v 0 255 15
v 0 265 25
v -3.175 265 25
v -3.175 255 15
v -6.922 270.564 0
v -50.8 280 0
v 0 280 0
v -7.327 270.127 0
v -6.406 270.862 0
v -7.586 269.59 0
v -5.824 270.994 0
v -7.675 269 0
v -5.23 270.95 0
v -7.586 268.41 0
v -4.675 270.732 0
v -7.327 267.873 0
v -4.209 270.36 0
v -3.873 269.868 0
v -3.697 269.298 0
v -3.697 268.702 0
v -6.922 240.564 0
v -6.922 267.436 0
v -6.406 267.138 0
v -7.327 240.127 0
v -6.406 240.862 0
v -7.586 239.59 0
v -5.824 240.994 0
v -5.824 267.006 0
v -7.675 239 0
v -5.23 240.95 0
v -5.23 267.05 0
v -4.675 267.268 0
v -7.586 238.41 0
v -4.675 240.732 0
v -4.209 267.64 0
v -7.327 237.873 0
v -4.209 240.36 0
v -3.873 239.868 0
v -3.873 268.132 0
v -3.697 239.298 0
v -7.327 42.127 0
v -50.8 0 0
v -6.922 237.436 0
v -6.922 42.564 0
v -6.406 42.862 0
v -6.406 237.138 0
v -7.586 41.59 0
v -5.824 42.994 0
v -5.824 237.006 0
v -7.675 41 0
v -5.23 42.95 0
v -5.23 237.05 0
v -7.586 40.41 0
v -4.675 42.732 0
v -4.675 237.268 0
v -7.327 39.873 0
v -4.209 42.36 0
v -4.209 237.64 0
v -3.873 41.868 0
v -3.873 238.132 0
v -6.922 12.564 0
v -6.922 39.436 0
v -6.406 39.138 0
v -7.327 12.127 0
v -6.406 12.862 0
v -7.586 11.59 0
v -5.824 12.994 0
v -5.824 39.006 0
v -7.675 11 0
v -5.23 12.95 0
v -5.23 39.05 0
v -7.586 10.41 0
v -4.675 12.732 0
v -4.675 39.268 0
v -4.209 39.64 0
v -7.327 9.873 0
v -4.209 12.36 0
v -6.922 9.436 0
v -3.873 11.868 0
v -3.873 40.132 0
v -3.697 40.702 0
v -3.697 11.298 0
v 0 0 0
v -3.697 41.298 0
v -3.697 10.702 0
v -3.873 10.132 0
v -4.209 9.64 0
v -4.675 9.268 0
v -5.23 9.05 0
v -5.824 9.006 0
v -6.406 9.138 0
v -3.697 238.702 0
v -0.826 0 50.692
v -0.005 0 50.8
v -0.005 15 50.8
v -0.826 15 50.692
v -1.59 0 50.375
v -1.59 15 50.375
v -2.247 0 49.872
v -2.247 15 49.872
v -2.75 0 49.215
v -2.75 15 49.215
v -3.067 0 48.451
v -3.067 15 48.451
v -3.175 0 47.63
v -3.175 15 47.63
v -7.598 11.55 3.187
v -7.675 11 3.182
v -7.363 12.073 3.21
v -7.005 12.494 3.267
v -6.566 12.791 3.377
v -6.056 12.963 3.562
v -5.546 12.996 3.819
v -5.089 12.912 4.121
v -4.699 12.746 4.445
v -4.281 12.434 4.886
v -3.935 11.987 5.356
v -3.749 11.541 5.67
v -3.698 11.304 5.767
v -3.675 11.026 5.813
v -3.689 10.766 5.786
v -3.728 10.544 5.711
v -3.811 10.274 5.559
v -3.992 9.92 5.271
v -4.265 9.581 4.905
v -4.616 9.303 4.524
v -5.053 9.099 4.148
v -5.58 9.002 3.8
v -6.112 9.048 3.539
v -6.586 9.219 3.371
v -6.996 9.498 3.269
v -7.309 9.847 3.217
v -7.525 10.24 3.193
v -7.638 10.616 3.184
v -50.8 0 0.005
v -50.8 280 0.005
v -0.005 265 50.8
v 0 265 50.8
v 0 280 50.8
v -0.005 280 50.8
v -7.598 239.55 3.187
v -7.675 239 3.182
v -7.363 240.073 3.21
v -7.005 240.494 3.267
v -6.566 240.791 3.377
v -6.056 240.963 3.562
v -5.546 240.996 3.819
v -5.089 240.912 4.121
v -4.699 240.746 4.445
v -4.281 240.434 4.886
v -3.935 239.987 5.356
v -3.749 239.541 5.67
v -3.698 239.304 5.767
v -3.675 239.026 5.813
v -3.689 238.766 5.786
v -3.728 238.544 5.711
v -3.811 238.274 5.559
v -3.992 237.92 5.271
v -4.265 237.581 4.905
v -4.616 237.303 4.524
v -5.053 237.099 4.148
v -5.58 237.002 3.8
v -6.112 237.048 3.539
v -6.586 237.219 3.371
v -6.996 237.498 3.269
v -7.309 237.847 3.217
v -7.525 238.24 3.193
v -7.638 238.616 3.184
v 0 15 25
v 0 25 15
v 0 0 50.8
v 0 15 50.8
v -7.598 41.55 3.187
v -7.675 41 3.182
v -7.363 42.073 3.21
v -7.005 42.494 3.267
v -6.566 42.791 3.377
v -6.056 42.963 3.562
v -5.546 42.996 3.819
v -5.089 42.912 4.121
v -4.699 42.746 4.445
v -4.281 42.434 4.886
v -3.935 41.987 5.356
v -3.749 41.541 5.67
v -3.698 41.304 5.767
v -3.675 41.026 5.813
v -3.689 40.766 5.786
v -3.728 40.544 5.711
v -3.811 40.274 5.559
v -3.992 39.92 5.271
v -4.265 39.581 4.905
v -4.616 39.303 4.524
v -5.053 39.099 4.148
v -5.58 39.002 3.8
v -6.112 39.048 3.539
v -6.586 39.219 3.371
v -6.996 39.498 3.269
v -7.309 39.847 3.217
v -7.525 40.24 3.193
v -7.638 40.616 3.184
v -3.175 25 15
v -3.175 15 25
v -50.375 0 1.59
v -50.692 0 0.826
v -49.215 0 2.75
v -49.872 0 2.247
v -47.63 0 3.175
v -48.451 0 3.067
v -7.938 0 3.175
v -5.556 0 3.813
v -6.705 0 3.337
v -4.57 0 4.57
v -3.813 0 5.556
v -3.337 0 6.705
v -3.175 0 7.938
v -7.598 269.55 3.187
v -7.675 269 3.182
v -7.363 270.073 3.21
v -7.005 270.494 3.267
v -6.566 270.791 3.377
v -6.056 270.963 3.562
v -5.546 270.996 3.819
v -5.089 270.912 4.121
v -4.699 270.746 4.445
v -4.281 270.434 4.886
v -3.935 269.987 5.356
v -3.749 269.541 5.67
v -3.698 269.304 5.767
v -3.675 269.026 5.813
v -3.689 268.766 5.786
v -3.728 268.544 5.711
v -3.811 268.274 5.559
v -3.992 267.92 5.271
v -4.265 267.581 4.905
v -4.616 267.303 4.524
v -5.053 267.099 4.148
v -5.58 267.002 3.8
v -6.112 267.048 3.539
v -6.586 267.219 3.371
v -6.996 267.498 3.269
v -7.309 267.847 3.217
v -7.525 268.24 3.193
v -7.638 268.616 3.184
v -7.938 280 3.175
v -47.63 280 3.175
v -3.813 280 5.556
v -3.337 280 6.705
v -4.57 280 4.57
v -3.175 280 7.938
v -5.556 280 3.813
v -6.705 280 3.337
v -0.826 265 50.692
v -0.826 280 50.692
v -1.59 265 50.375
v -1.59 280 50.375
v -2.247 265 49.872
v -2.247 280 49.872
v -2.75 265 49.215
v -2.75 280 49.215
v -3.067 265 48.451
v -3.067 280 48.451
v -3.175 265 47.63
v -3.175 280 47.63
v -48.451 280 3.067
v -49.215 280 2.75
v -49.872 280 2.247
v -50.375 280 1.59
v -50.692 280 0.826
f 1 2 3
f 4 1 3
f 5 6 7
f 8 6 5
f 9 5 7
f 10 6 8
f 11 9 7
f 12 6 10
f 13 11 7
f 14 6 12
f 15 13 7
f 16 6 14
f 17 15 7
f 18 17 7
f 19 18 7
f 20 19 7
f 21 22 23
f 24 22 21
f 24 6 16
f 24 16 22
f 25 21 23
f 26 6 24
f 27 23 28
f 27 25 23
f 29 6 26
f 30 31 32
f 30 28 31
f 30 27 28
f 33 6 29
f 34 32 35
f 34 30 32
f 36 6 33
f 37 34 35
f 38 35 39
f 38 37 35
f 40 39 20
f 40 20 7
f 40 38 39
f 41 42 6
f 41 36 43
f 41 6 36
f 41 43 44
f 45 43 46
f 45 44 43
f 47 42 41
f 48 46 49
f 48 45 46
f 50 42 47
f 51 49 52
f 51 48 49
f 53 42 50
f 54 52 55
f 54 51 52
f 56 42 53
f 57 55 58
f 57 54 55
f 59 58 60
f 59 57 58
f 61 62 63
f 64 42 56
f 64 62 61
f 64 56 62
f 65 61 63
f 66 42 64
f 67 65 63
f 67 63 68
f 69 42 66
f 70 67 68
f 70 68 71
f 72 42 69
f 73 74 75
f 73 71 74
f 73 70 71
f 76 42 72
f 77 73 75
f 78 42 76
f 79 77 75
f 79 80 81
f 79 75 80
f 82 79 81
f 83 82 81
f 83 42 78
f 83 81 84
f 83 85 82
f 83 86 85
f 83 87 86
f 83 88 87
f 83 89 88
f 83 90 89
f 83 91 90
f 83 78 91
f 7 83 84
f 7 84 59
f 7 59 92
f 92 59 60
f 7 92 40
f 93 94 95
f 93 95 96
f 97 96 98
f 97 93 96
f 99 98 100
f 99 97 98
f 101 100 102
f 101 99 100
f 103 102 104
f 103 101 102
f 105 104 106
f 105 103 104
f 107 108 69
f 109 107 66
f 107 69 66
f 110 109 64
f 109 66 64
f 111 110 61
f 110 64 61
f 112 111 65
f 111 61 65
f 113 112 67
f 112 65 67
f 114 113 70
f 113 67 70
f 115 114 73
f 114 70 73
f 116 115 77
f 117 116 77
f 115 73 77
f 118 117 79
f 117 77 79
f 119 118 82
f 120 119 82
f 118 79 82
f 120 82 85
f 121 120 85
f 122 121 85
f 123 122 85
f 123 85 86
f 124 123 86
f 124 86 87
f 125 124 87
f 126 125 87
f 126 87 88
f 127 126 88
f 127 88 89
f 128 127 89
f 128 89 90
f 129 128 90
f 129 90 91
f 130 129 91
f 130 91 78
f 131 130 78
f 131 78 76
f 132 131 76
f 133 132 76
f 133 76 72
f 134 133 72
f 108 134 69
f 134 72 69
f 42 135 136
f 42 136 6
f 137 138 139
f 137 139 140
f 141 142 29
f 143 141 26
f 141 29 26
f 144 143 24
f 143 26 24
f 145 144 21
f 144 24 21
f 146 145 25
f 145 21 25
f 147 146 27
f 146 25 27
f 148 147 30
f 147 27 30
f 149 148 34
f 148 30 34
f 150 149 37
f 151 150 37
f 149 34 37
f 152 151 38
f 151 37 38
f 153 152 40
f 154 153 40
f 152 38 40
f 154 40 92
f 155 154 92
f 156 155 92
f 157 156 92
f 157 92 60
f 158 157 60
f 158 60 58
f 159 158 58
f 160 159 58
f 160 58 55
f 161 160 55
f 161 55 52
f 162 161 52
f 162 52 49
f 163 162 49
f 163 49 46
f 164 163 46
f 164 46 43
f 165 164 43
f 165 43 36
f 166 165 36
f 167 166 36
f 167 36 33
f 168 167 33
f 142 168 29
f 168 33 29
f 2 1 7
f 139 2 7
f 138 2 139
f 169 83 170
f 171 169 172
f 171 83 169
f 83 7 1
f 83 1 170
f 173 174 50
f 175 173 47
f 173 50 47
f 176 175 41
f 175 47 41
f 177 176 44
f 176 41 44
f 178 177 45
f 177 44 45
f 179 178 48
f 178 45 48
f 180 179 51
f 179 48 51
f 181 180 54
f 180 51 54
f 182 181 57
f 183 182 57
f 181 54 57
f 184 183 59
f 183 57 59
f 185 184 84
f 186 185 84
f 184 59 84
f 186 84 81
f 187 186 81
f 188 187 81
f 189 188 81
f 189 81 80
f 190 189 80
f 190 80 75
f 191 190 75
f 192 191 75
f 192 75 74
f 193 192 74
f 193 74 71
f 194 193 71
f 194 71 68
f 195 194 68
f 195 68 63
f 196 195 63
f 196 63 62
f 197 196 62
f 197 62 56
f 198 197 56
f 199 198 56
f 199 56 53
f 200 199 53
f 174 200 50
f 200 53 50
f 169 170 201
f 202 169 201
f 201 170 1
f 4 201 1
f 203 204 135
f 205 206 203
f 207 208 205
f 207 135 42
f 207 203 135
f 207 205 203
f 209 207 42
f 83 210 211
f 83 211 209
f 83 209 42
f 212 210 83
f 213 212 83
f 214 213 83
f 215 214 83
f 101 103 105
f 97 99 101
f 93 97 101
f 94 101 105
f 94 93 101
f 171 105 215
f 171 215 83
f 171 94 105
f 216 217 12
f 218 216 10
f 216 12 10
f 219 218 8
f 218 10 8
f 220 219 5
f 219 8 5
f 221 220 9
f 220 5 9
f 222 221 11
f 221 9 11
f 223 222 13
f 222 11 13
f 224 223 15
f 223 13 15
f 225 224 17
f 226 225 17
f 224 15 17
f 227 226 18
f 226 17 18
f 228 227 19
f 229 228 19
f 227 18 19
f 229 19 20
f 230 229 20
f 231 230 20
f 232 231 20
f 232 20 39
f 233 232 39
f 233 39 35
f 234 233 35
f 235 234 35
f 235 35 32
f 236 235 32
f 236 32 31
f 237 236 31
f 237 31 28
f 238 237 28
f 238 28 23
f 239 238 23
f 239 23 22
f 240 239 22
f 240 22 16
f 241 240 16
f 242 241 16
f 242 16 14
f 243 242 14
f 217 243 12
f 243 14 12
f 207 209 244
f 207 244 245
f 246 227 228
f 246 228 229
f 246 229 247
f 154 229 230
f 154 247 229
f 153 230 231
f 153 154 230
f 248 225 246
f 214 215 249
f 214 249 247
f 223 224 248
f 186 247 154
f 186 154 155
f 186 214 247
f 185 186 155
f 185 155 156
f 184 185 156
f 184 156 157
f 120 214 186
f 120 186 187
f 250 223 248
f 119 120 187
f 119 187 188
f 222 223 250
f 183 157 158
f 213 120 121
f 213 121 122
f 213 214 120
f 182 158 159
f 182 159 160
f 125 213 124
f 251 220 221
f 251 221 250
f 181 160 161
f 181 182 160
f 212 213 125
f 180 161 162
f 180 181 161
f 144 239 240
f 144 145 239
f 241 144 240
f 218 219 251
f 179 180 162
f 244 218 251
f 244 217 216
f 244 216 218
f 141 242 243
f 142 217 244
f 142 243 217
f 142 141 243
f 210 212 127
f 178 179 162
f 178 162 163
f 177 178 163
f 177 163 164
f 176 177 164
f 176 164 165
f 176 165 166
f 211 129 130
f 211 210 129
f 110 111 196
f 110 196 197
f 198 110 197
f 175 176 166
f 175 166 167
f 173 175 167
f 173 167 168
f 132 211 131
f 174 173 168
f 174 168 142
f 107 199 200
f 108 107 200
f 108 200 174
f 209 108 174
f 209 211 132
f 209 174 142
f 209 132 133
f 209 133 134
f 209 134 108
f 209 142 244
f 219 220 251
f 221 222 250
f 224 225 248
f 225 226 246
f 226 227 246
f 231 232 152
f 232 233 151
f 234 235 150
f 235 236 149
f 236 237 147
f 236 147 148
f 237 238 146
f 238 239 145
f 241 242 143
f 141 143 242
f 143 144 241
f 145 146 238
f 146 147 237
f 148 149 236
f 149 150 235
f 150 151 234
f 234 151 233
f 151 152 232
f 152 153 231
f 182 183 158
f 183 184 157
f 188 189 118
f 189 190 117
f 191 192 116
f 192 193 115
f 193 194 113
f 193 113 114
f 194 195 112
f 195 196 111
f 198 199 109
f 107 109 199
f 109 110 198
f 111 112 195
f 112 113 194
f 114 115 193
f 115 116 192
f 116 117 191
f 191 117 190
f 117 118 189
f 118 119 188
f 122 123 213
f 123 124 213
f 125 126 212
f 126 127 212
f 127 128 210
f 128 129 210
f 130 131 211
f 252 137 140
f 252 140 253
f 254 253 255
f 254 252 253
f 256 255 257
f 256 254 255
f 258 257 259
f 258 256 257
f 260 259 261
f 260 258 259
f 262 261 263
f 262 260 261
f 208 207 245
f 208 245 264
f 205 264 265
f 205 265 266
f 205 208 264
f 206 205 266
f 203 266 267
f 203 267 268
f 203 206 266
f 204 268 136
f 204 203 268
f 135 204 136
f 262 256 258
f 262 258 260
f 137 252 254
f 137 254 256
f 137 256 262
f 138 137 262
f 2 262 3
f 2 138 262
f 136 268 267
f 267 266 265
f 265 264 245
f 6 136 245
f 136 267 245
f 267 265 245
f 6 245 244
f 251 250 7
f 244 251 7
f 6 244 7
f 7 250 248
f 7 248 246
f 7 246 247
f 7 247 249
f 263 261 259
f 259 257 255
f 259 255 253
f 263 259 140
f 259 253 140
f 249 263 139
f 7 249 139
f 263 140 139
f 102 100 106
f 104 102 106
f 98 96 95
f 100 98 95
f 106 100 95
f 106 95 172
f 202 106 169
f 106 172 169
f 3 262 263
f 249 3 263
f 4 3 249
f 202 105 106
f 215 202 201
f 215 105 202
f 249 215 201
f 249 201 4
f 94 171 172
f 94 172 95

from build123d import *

# Parameters (mm, degrees)
ANGULAR_ALUMINIO_ANGULAR_38MM_1_DEPTH = 280
CROQUIS8_W                            = 35.8
CROQUIS8_H                            = 250
CORTAR_EXTRUIR1_DEPTH                 = 4
CHAFL_N1_SIZE                         = 10
CROQUIS10_R                           = 2
CORTAR_EXTRUIR3_DEPTH                 = 10
CROQUIS12_R                           = 2
CORTAR_EXTRUIR4_DEPTH                 = 10


with BuildPart() as part:
    # Sketch11 → Angular ALUMINIO ANGULAR 38MM(1) (new body)
    with BuildSketch(Plane(origin=(0, 0, 0), x_dir=(-1, 0, 0), z_dir=(0, 1, 0))):
        with BuildLine():
            Line((0, 0), (0, 50.8))
            Line((0, 50.8), (0.00508, 50.8))
            ThreePointArc((0.00508, 50.8), (2.246551928, 49.871551928), (3.175, 47.63008))
            Line((3.175, 47.63008), (3.175, 7.9375))
            ThreePointArc((3.175, 7.9375), (4.569903955, 4.569903955), (7.9375, 3.175))
            Line((7.9375, 3.175), (47.63008, 3.175))
            ThreePointArc((47.63008, 3.175), (49.871551928, 2.246551928), (50.8, 0.00508))
            Line((50.8, 0.00508), (50.8, 0))
            Line((50.8, 0), (0, 0))
        make_face()
    extrude(amount=ANGULAR_ALUMINIO_ANGULAR_38MM_1_DEPTH)

    # Croquis8 → Cortar-Extruir1 (cut)
    with BuildSketch(Plane(origin=(0, 0, 0), x_dir=(0, 0, -1), z_dir=(1, 0, 0))):
        with Locations((-32.9, 140)):
            Rectangle(CROQUIS8_W, CROQUIS8_H)
    extrude(amount=-CORTAR_EXTRUIR1_DEPTH, mode=Mode.SUBTRACT)

    # Chaflán1
    chafl_n1_edges = [part.edges().sort_by_distance(p)[0] for p in [
        (-1.5875, 265, 15),
        (-1.5875, 15, 15),
    ]]
    chamfer(chafl_n1_edges, length=CHAFL_N1_SIZE)

    # Croquis10 → Cortar-Extruir3 (cut)
    with BuildSketch(Plane(origin=(0, 0, 0), x_dir=(-1, 0, 0), z_dir=(0, 0, -1))):
        with Locations((5.675, 41)):
            Circle(CROQUIS10_R)
        with Locations((5.675, 11)):
            Circle(CROQUIS10_R)
        with Locations((-44.325, 41)):
            Circle(CROQUIS10_R)
        with Locations((-44.325, 11)):
            Circle(CROQUIS10_R)
    extrude(amount=-CORTAR_EXTRUIR3_DEPTH, mode=Mode.SUBTRACT)

    # Croquis12 → Cortar-Extruir4 (cut)
    with BuildSketch(Plane(origin=(0, 0, 0), x_dir=(-1, 0, 0), z_dir=(0, 0, -1))):
        with Locations((5.675, 269)):
            Circle(CROQUIS12_R)
        with Locations((5.675, 239)):
            Circle(CROQUIS12_R)
    extrude(amount=-CORTAR_EXTRUIR4_DEPTH, mode=Mode.SUBTRACT)


solid = part.part
